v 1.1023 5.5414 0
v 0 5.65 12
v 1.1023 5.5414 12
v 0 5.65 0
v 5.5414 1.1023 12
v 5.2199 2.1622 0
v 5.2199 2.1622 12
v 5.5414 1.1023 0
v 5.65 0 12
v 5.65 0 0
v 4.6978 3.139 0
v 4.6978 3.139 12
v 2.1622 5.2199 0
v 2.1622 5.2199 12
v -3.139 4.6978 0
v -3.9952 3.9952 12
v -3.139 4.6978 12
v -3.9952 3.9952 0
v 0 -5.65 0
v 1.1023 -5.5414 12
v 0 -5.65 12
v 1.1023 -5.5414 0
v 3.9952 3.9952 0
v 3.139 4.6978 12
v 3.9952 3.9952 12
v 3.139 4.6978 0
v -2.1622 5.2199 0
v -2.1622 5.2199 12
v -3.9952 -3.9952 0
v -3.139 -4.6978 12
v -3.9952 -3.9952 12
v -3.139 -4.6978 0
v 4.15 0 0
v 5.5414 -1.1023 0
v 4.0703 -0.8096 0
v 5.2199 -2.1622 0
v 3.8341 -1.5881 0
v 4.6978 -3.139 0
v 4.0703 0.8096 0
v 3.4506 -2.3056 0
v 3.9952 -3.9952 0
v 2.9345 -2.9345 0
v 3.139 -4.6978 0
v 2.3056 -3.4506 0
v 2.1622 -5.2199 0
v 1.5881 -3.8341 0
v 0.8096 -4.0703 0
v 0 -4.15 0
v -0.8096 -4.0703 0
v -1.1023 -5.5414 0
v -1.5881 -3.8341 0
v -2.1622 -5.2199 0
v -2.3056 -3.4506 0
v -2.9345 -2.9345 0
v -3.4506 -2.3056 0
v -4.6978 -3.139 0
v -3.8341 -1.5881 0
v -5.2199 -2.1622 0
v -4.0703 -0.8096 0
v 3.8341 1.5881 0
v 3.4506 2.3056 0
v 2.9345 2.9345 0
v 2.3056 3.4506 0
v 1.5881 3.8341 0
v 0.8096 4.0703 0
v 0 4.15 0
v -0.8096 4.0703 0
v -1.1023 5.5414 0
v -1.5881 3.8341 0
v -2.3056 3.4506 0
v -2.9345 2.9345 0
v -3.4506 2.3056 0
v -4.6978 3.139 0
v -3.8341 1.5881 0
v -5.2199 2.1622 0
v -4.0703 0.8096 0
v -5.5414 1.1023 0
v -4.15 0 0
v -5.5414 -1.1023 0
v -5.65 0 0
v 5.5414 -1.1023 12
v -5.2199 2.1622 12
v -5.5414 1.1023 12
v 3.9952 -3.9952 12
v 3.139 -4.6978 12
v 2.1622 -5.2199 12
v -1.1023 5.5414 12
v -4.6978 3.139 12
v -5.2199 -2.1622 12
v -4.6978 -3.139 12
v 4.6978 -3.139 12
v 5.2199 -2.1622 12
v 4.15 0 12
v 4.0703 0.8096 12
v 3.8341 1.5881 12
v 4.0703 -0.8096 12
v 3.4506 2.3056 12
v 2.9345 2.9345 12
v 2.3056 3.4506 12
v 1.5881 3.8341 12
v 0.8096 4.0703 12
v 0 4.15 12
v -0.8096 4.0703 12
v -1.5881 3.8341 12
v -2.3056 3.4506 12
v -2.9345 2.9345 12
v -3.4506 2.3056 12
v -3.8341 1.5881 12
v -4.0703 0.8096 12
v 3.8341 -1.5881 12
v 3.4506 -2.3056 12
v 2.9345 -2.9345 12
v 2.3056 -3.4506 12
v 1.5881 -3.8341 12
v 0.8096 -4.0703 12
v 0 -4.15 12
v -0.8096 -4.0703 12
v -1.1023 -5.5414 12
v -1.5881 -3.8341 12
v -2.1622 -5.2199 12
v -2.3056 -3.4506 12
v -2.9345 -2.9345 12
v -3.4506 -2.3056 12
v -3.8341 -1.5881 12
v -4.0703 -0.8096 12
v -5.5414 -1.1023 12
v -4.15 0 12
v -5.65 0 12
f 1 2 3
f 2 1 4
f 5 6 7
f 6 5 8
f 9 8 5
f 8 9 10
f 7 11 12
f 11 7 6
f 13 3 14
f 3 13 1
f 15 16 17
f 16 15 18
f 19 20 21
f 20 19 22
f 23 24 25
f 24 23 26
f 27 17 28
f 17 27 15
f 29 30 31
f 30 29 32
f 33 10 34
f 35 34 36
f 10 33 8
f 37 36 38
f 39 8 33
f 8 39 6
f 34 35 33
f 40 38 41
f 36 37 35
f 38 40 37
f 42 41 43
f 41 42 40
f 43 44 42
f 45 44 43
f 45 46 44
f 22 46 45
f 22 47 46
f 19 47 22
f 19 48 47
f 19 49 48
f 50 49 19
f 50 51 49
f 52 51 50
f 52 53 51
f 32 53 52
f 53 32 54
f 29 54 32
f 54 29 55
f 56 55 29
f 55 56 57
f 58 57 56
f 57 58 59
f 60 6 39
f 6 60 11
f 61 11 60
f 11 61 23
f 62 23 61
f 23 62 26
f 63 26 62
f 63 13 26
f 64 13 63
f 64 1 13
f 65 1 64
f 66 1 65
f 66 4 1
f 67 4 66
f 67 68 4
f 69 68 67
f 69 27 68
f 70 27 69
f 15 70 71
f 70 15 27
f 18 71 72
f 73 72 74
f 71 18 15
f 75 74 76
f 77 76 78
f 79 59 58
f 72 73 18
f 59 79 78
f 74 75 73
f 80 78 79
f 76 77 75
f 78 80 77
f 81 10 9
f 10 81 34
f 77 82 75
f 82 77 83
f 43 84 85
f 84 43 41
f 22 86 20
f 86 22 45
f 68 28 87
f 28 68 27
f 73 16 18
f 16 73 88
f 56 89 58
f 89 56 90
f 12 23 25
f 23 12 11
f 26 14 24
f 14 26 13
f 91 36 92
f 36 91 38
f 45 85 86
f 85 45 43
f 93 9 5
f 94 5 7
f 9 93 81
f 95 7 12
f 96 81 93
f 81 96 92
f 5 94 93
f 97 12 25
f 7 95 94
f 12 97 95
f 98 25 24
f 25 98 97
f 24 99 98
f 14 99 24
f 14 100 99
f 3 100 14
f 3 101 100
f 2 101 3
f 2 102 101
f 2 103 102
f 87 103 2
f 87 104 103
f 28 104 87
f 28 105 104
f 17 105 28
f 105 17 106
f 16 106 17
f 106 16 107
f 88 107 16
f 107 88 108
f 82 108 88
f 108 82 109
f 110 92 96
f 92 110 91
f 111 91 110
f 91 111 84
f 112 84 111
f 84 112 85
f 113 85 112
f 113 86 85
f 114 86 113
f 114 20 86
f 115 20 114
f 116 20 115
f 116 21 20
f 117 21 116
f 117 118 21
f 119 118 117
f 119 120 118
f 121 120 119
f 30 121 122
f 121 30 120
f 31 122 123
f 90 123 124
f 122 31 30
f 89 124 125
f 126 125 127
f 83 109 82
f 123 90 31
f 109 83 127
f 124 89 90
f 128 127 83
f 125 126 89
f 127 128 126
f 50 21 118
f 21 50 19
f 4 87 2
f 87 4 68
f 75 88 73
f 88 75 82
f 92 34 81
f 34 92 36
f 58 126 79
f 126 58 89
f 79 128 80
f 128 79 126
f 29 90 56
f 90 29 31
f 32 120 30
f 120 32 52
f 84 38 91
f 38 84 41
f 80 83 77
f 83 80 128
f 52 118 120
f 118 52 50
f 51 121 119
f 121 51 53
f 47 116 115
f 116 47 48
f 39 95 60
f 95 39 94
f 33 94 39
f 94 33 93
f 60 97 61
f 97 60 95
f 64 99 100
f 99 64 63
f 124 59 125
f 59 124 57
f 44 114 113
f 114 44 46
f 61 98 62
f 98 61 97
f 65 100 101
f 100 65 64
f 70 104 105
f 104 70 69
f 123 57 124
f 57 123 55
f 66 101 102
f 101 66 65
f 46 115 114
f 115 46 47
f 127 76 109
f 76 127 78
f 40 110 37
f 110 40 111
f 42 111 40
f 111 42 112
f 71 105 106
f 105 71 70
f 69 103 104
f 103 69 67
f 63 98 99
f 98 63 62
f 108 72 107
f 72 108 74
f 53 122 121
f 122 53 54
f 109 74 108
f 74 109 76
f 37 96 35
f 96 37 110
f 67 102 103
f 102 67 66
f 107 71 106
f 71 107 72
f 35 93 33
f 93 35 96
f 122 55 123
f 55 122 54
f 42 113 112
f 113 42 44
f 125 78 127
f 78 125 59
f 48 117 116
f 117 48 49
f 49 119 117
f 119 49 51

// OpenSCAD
$fn = 32;

// ----------------------------------------------------------------------
// Spacer sleeve: 11.3 / 8.3 x 12 mm
// ----------------------------------------------------------------------

// --- parameters (mm) ---
outer_d = 11.3;           // outside diameter
inner_d = 8.3;            // shaft bore
length = 12;              // sleeve length

module sleeve() {
  cylinder(h = length, d = outer_d);
}

difference() {
  sleeve();
  translate([0, 0, -1]) cylinder(h = length + 2, d = inner_d);
}
